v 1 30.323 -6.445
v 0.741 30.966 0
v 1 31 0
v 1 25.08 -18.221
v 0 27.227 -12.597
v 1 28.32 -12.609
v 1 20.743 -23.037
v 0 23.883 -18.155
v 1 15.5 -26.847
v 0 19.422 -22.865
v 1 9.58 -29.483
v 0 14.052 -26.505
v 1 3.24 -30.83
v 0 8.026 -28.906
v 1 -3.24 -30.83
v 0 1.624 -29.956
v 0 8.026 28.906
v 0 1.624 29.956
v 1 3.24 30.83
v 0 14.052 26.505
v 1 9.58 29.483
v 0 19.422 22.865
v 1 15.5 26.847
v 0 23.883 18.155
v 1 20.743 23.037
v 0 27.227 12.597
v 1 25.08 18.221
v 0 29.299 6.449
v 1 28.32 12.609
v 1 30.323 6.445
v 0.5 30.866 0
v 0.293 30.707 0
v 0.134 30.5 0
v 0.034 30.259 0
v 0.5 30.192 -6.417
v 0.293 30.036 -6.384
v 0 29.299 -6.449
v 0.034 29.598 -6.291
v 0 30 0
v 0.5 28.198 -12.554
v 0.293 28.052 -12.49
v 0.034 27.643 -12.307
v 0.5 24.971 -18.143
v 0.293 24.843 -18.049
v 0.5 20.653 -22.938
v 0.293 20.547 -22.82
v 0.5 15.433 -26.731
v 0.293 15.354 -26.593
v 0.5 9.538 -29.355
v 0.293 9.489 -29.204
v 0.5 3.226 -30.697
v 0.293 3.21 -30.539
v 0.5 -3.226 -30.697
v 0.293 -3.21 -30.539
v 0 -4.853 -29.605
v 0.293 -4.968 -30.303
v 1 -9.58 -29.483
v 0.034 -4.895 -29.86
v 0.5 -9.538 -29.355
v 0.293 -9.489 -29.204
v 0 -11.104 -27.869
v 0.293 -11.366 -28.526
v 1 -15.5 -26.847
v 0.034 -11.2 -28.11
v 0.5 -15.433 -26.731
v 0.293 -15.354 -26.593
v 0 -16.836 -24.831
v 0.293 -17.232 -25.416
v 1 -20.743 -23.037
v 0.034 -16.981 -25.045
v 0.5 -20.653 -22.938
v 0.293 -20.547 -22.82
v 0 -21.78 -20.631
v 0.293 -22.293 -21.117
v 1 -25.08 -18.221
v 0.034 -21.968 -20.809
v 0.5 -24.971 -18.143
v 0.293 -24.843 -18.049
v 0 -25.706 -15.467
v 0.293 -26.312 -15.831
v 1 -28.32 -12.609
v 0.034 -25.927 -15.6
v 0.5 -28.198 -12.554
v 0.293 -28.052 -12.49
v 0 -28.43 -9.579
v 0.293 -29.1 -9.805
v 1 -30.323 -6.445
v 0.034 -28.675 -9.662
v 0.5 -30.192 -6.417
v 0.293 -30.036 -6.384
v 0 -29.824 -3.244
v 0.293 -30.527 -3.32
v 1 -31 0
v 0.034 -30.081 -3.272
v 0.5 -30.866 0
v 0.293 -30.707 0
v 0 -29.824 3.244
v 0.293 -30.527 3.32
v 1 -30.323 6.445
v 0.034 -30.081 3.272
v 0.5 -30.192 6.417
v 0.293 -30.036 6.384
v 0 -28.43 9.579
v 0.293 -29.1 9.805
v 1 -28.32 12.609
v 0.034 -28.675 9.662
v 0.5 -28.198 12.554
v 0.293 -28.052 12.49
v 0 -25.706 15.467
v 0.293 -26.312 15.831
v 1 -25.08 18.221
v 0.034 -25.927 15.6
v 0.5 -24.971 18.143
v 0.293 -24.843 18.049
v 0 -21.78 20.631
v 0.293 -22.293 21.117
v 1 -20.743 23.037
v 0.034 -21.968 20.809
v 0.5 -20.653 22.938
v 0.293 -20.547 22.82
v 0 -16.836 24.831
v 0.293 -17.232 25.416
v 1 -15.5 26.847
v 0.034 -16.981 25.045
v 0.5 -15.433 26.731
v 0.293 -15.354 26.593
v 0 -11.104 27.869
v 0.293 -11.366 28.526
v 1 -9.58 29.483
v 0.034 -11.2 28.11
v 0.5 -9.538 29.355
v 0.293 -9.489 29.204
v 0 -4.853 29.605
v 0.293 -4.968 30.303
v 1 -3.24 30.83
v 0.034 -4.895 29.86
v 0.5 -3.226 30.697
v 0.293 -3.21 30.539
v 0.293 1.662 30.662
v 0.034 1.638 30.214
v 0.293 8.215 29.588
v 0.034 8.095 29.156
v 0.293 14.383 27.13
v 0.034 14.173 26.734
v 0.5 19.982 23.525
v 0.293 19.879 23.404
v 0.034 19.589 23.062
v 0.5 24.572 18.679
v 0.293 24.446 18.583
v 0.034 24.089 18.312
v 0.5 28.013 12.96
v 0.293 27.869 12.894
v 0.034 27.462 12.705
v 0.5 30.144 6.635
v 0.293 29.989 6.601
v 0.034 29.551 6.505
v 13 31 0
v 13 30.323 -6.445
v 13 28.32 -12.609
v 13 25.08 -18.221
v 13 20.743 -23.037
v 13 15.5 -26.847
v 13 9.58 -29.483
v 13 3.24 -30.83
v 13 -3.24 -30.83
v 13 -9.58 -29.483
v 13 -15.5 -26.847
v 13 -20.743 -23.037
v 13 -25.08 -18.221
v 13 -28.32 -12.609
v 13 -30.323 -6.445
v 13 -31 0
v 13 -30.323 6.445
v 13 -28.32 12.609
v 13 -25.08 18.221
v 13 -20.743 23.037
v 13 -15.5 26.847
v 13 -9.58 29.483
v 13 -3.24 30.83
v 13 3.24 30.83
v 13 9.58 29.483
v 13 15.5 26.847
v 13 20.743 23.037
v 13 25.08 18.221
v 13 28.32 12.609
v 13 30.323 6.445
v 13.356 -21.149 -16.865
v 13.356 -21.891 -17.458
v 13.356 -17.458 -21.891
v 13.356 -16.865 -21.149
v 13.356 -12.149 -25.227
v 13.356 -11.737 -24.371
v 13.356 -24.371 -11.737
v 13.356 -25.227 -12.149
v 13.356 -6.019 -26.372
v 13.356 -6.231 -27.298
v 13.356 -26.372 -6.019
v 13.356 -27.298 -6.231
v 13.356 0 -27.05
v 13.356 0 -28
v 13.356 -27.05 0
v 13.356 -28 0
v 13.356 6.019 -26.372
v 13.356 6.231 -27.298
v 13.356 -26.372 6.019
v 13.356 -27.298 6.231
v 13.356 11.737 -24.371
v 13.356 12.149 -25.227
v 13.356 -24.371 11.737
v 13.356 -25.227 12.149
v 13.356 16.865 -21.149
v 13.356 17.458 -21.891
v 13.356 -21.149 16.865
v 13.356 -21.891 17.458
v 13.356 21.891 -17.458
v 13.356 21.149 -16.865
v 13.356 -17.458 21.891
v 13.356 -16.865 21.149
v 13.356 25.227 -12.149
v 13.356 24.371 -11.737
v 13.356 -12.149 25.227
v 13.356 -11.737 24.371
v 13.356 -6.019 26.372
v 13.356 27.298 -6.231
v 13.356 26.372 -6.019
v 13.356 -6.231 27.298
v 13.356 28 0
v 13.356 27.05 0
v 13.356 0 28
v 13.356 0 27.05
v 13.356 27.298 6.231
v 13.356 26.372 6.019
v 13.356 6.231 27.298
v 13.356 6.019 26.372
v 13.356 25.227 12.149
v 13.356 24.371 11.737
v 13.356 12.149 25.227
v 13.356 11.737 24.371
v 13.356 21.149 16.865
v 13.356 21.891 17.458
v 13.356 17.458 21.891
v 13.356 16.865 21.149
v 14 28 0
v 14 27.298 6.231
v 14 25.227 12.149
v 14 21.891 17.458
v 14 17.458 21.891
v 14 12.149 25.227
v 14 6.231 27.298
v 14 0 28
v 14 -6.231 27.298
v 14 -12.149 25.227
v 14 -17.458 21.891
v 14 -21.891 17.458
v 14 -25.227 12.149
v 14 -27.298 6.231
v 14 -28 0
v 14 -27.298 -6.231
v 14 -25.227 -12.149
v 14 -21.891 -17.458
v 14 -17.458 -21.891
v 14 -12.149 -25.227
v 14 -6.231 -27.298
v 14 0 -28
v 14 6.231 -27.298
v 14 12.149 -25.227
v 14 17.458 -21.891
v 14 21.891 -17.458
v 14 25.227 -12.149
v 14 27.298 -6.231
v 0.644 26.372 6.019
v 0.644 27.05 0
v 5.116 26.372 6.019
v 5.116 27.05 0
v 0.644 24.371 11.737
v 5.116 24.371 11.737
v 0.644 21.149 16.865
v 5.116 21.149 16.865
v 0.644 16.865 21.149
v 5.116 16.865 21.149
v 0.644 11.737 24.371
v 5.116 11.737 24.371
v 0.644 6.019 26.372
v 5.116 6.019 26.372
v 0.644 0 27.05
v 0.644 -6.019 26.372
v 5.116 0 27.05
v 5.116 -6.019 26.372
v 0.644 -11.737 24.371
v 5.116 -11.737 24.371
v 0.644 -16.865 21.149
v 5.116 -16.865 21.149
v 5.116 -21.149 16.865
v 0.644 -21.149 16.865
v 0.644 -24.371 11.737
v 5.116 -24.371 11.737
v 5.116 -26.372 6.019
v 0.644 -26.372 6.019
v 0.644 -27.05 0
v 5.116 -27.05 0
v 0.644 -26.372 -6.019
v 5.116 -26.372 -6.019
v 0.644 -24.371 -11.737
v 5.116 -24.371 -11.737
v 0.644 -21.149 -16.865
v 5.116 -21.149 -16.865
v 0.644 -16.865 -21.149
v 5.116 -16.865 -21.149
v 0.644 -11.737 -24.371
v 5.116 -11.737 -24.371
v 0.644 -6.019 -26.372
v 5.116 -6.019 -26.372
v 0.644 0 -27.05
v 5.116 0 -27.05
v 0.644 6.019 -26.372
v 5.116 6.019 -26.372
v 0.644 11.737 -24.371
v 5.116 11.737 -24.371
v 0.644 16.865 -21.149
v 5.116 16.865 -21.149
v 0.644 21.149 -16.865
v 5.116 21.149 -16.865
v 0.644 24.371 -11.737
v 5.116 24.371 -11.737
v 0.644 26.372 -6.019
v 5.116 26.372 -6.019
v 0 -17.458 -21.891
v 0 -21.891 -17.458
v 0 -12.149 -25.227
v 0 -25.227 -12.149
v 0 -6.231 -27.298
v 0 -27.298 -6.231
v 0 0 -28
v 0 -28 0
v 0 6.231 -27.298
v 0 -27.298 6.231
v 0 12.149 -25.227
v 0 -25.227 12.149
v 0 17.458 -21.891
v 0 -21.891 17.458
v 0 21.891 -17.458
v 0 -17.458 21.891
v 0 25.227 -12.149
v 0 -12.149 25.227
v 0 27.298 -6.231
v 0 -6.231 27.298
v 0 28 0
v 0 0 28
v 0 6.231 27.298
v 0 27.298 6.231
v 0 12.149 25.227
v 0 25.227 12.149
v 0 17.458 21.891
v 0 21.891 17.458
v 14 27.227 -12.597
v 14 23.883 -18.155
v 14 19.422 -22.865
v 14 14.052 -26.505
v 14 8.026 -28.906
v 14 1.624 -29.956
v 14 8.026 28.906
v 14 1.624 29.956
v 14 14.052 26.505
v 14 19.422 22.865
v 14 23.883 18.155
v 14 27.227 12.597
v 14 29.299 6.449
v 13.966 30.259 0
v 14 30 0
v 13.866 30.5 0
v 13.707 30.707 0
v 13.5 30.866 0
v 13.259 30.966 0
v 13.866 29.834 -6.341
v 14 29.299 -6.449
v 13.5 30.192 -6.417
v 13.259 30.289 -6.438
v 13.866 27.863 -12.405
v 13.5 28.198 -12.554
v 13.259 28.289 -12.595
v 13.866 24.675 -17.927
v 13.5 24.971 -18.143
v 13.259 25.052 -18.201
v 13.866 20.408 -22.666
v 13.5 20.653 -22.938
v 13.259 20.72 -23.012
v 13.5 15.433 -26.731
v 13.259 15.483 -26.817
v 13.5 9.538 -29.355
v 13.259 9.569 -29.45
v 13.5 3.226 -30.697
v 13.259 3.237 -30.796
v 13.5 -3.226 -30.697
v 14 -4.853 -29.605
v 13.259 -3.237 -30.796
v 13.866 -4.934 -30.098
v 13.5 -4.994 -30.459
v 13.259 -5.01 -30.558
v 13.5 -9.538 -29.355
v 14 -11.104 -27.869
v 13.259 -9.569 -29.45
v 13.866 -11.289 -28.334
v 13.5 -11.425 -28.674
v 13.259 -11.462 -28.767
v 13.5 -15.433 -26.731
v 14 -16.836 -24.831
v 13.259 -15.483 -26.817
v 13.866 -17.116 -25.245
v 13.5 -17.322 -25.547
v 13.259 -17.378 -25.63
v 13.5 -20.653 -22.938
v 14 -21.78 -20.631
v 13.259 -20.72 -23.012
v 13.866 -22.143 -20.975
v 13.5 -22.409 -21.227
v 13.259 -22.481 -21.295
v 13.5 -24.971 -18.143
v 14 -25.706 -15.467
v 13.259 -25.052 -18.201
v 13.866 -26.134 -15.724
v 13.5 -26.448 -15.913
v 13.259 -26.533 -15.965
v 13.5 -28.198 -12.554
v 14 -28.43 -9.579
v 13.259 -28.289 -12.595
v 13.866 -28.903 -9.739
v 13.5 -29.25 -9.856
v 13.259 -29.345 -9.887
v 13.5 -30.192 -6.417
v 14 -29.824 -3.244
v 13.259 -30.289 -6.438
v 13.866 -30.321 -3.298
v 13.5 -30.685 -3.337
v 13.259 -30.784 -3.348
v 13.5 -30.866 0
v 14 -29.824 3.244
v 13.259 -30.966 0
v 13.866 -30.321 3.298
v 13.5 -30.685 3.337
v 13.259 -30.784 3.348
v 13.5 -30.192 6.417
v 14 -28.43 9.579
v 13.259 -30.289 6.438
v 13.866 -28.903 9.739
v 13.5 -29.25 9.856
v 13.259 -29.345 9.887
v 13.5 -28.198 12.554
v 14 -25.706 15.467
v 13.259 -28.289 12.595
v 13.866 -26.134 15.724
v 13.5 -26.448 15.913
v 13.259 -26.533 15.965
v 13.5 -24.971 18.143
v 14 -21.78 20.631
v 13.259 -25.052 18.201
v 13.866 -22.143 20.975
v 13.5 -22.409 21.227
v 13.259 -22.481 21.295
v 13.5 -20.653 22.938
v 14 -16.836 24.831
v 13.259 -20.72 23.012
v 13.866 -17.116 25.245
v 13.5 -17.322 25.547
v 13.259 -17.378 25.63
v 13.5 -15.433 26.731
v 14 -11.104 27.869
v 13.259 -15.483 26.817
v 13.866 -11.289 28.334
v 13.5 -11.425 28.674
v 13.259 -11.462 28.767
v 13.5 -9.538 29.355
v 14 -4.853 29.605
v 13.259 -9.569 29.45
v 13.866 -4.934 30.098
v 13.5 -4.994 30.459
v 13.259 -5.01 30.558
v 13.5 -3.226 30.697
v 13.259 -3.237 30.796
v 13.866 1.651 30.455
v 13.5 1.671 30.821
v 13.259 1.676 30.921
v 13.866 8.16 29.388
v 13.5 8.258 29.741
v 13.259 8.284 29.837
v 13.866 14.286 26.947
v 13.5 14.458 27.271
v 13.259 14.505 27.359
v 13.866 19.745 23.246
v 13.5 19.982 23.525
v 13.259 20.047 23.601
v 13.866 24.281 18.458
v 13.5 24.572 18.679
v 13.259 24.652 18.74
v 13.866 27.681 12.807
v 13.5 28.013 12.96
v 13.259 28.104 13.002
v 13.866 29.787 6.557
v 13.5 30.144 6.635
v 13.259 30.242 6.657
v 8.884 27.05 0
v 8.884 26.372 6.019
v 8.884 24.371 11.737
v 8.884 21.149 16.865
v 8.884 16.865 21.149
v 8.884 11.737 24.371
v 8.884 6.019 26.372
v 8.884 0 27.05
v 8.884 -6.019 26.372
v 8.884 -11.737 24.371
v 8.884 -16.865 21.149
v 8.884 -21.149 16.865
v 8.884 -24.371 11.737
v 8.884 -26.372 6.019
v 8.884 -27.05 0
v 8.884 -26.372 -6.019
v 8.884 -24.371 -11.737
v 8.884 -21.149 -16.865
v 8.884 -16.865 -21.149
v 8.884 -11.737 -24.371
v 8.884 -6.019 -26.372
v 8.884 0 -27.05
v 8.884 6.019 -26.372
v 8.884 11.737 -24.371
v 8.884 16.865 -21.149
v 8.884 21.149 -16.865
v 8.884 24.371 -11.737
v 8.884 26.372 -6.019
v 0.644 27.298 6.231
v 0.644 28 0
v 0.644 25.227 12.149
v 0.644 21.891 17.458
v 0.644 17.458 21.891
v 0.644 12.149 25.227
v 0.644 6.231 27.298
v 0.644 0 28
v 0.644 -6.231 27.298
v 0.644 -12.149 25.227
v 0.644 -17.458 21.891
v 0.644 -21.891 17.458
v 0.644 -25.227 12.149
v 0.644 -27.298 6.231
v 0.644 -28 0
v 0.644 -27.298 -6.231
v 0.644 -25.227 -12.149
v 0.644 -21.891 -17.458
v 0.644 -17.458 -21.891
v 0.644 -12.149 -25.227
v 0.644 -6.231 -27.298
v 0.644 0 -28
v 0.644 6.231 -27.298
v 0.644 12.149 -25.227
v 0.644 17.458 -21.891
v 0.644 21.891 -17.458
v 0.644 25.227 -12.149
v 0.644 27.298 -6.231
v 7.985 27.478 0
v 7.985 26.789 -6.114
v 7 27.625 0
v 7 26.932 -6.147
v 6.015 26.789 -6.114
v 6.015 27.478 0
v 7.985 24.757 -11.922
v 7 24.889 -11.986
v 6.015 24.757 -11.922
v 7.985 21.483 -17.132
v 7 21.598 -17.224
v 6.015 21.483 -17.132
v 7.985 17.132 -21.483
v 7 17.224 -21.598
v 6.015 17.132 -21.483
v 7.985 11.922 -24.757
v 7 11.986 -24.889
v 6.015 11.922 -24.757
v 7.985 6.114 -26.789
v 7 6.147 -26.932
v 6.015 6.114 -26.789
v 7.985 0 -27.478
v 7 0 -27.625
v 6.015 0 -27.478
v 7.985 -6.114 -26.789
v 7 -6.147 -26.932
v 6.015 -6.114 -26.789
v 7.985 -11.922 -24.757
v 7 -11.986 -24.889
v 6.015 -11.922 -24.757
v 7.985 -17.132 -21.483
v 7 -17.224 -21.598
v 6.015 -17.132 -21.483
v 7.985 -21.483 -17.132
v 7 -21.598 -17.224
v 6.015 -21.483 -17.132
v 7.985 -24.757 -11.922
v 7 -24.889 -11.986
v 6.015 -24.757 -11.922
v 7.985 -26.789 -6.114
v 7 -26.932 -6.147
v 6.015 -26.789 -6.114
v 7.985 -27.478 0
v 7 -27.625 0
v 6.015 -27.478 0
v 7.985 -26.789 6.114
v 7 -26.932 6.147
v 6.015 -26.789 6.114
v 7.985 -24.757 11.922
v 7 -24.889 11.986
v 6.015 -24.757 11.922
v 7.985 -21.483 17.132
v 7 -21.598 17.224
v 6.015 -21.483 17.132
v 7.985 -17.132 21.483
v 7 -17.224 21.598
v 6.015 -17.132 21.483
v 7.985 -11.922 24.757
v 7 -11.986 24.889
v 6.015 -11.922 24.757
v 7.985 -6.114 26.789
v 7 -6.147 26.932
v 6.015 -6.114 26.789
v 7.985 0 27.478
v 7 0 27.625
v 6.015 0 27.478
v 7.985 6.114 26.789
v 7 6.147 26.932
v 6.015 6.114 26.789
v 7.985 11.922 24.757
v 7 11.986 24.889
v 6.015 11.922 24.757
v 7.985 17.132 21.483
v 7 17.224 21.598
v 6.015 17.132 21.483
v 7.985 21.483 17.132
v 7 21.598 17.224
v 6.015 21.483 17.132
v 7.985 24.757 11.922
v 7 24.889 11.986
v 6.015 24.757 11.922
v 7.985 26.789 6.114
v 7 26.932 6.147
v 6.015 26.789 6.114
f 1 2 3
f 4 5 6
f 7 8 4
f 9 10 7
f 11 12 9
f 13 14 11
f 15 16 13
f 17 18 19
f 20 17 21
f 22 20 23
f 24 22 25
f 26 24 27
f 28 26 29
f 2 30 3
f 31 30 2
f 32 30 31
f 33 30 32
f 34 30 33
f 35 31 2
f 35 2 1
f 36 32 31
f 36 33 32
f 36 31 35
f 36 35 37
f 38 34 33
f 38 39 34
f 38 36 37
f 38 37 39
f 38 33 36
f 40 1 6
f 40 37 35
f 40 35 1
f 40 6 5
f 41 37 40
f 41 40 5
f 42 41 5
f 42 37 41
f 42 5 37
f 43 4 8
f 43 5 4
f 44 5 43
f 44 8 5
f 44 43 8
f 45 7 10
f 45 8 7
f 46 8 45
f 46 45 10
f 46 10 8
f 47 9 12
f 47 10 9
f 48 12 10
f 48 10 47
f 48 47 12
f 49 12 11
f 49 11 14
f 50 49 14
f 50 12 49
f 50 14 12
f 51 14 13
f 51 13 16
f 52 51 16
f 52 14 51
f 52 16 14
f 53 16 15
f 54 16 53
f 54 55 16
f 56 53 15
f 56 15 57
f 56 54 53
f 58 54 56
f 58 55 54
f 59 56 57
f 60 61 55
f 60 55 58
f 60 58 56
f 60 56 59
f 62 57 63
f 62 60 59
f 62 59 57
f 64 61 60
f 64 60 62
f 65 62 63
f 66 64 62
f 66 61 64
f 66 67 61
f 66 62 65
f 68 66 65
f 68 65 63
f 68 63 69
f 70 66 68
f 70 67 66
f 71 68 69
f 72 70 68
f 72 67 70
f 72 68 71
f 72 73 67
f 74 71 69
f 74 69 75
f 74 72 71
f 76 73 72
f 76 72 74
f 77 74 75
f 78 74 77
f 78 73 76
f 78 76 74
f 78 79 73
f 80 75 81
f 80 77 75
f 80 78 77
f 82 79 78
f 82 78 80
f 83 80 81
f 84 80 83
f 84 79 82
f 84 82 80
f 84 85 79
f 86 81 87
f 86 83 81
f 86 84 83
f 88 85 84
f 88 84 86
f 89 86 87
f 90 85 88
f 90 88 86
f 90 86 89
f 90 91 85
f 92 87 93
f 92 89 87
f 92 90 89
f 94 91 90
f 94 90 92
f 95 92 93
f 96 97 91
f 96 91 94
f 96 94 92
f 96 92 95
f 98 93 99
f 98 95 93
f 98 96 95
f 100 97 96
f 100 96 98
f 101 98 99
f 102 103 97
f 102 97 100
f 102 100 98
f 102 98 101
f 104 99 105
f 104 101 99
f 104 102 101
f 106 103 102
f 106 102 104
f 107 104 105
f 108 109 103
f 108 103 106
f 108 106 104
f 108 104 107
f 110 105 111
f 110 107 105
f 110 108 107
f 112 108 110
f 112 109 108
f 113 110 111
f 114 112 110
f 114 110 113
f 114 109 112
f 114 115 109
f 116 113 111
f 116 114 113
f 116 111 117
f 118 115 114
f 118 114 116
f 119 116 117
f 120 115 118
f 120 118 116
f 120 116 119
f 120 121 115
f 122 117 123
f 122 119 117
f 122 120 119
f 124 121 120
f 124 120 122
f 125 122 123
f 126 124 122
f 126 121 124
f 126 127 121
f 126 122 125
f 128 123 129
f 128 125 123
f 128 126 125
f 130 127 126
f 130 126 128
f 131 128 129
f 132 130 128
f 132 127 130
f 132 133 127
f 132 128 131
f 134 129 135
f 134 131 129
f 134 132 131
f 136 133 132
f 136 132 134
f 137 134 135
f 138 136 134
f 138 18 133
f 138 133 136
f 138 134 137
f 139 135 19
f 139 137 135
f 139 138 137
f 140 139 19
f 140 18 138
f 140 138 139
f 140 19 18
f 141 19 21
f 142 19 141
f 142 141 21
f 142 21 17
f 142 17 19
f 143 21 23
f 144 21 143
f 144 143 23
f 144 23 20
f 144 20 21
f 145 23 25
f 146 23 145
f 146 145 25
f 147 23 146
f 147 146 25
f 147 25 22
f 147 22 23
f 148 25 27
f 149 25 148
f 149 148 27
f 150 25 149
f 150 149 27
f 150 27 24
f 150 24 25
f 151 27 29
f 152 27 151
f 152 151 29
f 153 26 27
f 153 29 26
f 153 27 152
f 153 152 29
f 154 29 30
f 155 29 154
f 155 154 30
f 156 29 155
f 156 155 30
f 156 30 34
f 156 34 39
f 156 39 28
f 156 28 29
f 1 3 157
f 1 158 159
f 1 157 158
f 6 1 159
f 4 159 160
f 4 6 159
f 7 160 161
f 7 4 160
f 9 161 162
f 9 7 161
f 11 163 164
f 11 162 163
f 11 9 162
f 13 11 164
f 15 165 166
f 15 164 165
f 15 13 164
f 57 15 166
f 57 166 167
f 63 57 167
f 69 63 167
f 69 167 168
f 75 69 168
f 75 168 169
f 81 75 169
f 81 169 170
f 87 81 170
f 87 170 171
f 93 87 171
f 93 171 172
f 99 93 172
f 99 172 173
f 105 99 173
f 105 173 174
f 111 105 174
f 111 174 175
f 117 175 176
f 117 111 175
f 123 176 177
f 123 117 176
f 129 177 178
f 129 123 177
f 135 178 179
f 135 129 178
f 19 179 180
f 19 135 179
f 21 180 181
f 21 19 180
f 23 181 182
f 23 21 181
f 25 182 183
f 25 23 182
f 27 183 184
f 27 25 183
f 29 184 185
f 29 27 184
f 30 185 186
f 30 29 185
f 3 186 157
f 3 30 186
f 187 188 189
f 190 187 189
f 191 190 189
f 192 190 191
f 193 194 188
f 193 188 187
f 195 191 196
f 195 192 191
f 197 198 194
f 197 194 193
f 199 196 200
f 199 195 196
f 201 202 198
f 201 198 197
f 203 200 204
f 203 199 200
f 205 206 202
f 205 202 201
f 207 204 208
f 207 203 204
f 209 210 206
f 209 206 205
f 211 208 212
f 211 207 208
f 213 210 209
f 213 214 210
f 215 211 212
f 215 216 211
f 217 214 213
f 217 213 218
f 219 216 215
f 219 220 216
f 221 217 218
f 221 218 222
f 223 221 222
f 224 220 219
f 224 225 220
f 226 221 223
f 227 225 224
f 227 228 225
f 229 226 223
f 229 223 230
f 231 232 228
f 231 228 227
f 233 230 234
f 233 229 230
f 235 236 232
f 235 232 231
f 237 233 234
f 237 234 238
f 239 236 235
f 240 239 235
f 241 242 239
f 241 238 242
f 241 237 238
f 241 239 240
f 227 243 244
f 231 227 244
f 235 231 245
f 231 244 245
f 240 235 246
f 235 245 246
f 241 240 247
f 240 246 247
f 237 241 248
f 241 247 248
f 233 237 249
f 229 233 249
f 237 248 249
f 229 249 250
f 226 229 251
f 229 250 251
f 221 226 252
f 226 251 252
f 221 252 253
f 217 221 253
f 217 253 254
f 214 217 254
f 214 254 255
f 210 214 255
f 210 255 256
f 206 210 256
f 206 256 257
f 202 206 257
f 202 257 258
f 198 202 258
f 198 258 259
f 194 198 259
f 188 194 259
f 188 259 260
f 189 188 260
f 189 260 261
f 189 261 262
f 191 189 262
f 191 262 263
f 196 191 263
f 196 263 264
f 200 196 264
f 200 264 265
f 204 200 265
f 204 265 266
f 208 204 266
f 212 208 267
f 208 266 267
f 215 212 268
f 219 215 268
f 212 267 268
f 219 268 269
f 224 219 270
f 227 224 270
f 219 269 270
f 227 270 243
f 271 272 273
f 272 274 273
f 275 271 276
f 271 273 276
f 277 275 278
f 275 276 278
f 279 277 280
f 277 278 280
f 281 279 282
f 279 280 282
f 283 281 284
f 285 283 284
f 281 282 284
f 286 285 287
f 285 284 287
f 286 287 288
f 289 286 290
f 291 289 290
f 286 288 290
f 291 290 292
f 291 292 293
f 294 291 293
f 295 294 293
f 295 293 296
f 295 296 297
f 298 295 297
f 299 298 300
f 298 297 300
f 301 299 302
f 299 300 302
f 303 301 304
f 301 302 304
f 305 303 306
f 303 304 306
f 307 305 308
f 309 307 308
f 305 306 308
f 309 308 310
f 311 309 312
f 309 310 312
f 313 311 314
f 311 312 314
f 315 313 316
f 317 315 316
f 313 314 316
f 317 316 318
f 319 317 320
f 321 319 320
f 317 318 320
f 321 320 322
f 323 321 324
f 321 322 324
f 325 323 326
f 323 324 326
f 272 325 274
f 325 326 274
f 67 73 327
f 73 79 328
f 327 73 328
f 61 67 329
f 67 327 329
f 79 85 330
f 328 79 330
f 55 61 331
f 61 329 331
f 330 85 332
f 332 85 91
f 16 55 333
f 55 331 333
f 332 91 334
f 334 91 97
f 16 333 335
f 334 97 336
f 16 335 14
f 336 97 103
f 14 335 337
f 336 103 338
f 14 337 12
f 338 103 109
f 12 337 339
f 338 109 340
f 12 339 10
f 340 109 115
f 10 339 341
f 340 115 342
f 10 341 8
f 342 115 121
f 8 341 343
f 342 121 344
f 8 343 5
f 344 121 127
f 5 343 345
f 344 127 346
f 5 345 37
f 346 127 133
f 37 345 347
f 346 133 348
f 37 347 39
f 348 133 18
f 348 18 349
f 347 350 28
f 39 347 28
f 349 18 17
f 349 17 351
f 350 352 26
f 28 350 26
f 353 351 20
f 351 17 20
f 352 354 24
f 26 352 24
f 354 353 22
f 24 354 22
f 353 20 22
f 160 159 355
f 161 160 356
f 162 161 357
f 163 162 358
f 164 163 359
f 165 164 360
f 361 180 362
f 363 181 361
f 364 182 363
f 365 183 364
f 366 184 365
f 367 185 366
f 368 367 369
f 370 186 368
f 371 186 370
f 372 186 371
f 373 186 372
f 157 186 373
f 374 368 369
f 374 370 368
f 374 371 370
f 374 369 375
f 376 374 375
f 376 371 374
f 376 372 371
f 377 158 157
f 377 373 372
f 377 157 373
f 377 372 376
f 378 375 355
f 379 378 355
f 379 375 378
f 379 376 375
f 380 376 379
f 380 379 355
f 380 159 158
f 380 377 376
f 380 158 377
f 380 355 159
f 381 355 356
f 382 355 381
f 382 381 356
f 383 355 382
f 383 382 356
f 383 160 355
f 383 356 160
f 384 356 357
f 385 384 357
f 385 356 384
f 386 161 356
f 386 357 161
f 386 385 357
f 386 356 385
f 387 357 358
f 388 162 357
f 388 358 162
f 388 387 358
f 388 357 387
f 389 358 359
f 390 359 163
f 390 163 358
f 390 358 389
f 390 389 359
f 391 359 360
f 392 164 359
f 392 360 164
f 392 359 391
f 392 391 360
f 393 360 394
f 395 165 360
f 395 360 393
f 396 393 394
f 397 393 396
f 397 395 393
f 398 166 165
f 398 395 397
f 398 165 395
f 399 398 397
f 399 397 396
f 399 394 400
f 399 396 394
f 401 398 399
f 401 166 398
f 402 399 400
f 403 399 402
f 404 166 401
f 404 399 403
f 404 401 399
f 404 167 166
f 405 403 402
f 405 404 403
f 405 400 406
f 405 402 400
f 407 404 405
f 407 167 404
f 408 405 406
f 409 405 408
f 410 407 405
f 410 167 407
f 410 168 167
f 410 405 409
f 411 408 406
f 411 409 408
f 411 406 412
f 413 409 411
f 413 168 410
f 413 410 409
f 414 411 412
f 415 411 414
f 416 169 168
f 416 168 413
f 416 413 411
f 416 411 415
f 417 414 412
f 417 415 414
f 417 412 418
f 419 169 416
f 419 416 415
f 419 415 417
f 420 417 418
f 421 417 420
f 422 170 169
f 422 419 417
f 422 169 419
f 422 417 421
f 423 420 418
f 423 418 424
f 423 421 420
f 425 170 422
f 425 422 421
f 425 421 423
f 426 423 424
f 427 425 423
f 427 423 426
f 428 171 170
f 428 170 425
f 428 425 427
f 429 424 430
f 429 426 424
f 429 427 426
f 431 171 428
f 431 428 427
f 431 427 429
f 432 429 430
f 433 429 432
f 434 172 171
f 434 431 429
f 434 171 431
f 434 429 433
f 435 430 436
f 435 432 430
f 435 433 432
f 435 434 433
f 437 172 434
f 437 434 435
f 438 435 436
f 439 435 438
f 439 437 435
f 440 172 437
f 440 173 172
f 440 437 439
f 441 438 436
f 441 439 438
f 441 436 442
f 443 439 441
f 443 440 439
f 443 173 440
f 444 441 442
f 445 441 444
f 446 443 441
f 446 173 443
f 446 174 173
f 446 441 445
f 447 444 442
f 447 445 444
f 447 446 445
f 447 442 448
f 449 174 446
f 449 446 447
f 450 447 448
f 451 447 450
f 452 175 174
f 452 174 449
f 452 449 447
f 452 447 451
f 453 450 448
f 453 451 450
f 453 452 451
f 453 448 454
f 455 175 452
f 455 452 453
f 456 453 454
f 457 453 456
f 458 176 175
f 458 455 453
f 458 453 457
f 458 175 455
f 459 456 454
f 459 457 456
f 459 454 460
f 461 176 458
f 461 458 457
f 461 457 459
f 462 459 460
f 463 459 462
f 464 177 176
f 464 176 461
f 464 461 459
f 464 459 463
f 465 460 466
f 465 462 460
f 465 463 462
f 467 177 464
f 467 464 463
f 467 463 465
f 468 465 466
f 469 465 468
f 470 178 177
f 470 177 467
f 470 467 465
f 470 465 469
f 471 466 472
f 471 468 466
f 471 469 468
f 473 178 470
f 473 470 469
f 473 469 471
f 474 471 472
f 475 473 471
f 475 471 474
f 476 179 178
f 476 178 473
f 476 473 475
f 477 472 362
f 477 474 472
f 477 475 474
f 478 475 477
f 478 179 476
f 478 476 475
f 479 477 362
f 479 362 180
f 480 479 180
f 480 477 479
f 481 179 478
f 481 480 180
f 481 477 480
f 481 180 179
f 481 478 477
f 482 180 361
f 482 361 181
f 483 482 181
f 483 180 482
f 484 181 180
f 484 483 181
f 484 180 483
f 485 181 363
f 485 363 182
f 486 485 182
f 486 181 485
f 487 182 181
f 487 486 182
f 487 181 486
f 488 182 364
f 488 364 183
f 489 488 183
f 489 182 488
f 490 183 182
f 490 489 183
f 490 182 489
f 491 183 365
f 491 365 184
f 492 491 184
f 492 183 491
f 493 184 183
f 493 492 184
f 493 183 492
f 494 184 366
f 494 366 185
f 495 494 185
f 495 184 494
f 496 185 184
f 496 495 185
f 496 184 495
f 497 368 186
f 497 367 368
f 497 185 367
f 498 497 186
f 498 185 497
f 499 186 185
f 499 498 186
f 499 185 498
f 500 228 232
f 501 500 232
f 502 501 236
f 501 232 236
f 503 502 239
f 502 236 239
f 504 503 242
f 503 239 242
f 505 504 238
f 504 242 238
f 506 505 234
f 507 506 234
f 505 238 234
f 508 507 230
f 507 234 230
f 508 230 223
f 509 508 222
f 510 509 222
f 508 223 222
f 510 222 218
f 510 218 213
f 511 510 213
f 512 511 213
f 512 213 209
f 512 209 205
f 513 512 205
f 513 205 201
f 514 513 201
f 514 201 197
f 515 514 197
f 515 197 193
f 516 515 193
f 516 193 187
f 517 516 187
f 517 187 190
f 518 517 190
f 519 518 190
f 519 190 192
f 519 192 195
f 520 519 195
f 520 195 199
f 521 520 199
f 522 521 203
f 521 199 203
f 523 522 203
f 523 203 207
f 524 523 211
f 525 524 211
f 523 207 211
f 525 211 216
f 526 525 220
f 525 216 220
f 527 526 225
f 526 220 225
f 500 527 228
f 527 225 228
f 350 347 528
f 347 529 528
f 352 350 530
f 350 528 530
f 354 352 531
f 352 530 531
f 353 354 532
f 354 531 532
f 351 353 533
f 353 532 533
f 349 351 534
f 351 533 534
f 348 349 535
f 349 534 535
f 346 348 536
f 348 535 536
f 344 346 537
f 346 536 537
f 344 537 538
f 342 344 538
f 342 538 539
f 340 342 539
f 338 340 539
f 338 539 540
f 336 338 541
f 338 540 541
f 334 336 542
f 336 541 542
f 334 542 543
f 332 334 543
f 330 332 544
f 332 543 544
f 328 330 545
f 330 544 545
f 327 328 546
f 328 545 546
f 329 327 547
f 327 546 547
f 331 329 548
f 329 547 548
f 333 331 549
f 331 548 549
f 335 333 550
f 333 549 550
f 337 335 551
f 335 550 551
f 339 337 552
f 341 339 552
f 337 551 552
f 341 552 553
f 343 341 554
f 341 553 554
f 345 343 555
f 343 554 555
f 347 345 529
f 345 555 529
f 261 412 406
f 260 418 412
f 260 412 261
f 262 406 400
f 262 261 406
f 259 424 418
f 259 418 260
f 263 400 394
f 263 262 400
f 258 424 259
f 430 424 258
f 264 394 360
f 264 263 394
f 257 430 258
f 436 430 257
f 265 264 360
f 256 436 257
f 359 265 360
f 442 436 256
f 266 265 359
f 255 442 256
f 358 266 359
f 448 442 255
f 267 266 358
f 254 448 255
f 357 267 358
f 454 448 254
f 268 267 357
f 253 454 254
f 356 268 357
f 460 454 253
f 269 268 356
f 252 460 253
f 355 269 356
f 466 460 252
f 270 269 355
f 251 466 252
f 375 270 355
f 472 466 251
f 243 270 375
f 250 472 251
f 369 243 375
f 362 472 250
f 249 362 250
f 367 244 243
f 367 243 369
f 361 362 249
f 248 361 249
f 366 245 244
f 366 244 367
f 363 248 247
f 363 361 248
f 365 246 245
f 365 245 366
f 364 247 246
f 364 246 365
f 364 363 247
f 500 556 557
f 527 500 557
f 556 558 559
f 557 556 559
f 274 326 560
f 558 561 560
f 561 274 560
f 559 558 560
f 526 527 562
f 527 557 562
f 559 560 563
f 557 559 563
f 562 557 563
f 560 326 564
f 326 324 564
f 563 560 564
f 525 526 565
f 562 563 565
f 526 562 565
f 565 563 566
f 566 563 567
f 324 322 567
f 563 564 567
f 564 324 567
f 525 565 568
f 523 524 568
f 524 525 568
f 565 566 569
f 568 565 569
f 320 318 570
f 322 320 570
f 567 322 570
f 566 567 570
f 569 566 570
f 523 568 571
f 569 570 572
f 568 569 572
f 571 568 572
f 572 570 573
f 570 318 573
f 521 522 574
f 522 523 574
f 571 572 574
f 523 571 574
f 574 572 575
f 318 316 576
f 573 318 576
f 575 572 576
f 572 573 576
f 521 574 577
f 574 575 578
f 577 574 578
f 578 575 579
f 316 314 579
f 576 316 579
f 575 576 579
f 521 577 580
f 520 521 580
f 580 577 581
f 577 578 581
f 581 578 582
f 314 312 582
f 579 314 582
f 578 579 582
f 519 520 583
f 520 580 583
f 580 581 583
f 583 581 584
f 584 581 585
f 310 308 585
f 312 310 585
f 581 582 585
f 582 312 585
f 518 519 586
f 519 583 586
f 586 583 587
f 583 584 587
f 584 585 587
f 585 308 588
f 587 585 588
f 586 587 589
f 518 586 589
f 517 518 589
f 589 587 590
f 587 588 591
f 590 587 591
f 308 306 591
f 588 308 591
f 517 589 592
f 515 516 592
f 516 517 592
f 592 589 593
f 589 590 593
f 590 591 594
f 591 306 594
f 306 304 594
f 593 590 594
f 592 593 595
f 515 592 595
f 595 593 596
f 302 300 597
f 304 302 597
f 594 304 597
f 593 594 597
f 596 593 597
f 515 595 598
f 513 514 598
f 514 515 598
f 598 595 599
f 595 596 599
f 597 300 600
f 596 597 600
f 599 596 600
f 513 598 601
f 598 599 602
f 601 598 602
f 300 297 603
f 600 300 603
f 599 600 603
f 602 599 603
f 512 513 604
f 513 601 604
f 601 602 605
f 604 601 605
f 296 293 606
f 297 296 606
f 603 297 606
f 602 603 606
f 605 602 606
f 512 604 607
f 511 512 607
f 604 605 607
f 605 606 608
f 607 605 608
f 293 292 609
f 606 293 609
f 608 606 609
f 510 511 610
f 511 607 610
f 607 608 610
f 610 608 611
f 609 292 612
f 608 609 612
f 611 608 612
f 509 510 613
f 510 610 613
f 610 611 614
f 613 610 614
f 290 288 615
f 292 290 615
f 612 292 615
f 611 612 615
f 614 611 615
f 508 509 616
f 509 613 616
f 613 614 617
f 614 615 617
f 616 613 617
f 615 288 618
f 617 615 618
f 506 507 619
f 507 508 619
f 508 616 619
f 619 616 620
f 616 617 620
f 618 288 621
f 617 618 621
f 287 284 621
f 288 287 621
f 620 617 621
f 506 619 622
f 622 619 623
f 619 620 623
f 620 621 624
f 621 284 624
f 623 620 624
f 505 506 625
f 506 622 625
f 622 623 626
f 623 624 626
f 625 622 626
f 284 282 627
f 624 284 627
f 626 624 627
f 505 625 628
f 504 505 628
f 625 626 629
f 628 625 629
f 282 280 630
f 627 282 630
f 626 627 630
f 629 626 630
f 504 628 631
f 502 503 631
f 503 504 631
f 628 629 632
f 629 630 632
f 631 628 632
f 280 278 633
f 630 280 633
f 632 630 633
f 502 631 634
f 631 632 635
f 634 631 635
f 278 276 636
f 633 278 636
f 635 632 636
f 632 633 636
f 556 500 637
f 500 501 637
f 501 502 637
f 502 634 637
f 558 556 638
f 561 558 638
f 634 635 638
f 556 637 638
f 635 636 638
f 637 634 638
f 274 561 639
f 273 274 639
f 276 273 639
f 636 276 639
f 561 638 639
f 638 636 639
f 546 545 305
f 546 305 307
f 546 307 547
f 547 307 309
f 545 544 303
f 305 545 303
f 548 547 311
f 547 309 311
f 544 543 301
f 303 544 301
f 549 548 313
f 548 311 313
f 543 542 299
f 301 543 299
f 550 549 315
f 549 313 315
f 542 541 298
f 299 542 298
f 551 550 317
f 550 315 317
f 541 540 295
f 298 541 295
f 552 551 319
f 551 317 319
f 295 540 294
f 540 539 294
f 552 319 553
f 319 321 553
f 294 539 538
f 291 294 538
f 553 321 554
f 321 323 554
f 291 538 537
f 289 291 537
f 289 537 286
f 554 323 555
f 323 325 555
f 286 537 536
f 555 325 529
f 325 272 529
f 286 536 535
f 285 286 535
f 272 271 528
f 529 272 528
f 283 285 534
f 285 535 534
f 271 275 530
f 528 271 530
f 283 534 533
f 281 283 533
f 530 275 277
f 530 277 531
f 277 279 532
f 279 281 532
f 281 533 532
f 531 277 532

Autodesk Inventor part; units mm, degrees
sketch "Sketch_1" plane through (0, 0, 0) normal (0, 0, 1) x (1, 0, 0)
  line L0 (14, 0) -> (0, 0)
  line L1 (0, 28) -> (0.644, 28)
  line L2 (0.644, 28) -> (0.644, 27.05)
  line L3 (0.644, 27.05) -> (5.1157, 27.05)
  arc A0 (8.8843, 27.05) -> (5.1157, 27.05) centre (7, 24.25) ccw
  line L4 (8.8843, 27.05) -> (13.356, 27.05)
  line L5 (13.356, 27.05) -> (13.356, 28)
  line L6 (13.356, 28) -> (14, 28)
  line L7 (14, 28) -> (14, 30)
  arc A1 (14, 30) -> (13, 31) centre (13, 30) ccw
  line L8 (13, 31) -> (1, 31)
  arc A2 (1, 31) -> (0, 30) centre (1, 30) ccw
  line L9 (0, 30) -> (0, 28)
revolve "Revolution1" add sketch "Sketch_1" angle 360 about axis through (14, 0, 0) along (1, 0, 0)
ref_plane "ip_cst_1_or_1_XY" through (0, 0, 0) normal (1, 0, 0) x (0, 0, -1)
ref_plane "ip_cst_1_or_1_YZ" through (0, 0, 0) normal (0, 0, -1) x (0, 1, 0)
ref_plane "ip_cst_1_or_1_ZX" through (0, 0, 0) normal (0, 1, 0) x (1, 0, 0)
ref_plane "ip_cst_1_or_2_XY" through (0, 0, 0) normal (-1, 0, 0) x (0, 0, -1)
ref_plane "ip_cst_1_or_2_YZ" through (0, 0, 0) normal (0, 0, -1) x (0, -1, 0)
ref_plane "ip_cst_1_or_2_ZX" through (0, 0, 0) normal (0, -1, 0) x (-1, 0, 0)
ref_plane "ip_cst_1_or_3_XY" through (0.644, 0, 0) normal (1, 0, 0) x (0, 0, -1)
ref_plane "ip_cst_1_or_3_YZ" through (0.644, 0, 0) normal (0, 0, -1) x (0, 1, 0)
ref_plane "ip_cst_1_or_3_ZX" through (0.644, 0, 0) normal (0, 1, 0) x (1, 0, 0)
ref_plane "ip_cst_1_or_4_XY" through (13.356, 0, 0) normal (-1, 0, 0) x (0, 0, -1)
ref_plane "ip_cst_1_or_4_YZ" through (13.356, 0, 0) normal (0, 0, -1) x (0, -1, 0)
ref_plane "ip_cst_1_or_4_ZX" through (13.356, 0, 0) normal (0, -1, 0) x (-1, 0, 0)
properties part number "6007DDU Outer ring"
